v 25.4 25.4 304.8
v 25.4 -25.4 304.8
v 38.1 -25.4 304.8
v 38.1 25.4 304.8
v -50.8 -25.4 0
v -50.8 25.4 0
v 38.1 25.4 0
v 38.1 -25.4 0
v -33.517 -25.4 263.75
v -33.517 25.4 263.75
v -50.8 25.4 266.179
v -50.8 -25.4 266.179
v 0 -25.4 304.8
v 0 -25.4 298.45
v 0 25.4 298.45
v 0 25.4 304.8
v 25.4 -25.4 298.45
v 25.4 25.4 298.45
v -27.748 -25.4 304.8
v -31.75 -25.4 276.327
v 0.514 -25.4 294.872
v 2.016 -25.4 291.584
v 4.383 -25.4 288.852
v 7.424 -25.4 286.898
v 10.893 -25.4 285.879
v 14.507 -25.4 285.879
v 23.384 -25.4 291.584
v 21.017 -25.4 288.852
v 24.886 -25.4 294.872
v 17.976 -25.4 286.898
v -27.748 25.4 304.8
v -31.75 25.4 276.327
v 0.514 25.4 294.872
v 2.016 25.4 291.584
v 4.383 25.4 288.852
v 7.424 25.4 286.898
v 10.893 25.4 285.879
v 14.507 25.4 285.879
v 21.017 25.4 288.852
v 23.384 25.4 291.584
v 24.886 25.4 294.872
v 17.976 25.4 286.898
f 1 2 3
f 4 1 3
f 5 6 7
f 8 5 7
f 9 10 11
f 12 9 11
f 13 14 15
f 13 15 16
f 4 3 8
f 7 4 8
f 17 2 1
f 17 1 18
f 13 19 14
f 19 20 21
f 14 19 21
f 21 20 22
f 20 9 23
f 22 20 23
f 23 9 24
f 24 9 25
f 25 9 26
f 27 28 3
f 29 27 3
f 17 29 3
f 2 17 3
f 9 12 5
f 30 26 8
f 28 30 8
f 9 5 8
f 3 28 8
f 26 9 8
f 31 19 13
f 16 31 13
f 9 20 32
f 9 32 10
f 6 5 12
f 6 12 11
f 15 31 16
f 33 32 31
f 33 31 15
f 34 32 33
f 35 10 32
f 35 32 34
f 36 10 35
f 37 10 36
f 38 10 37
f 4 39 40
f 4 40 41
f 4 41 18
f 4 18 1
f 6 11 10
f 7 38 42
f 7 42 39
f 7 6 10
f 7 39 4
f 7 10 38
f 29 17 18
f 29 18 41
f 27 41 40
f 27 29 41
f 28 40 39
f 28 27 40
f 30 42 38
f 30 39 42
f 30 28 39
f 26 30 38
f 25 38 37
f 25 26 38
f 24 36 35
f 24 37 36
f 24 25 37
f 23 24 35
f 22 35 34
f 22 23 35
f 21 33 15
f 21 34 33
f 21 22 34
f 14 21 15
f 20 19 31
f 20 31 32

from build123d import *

# Parameters (mm, degrees)
SKETCH1_W               = 101.6
SKETCH1_H               = 50.8
BOSS_EXTRUDE1_DEPTH     = 304.8
CUT_EXTRUDE1_DEPTH      = 314.152231351
CUT_EXTRUDE1_DEPTH_BACK = 314.152231351
CUT_EXTRUDE2_DEPTH      = 314.152231351
CUT_EXTRUDE2_DEPTH_BACK = 314.152231351
SKETCH3_W               = 12.7
SKETCH3_H               = 304.8


with BuildPart() as part:
    # Sketch1 → Boss-Extrude1 (new body)
    with BuildSketch(Plane.XY):
        Rectangle(SKETCH1_W, SKETCH1_H)
    extrude(amount=BOSS_EXTRUDE1_DEPTH)

    # Sketch2 → Cut-Extrude1 (cut, two sides: drawn at the far end of the back side and taken through both)
    with BuildSketch(Plane(origin=(0, 25.4, 0), x_dir=(1, 0, 0), z_dir=(0, 1, 0)).offset(-CUT_EXTRUDE1_DEPTH_BACK)):
        with BuildLine():
            ThreePointArc((25.4, -298.45), (12.7, -285.75), (0, -298.45))
            ThreePointArc((0, -298.45), (0.432742006, -301.737001873), (1.701477372, -304.8))
            Line((1.701477372, -304.8), (23.698522628, -304.8))
            ThreePointArc((23.698522628, -304.8), (24.967257994, -301.737001873), (25.4, -298.45))
        make_face()
        with BuildLine():
            Line((23.698522628, -304.8), (1.701477372, -304.8))
            ThreePointArc((1.701477372, -304.8), (12.7, -311.15), (23.698522628, -304.8))
        make_face()
        with BuildLine():
            Line((25.4, -304.8), (25.4, -298.45))
            ThreePointArc((25.4, -298.45), (24.967257994, -301.737001873), (23.698522628, -304.8))
            Line((23.698522628, -304.8), (25.4, -304.8))
        make_face()
        with BuildLine():
            Line((0, -298.45), (0, -304.8))
            Line((0, -304.8), (1.701477372, -304.8))
            ThreePointArc((1.701477372, -304.8), (0.432742006, -301.737001873), (0, -298.45))
        make_face()
        Polygon((-31.75, -276.3266), (-50.8, -279.003902901), (-50.8, -304.8), (-27.748324597, -304.8), align=None)
        Polygon((-50.8, -266.17909273), (-50.8, -279.003902901), (-31.75, -276.3266), (-33.517498382, -263.750195527), align=None)
    extrude(amount=CUT_EXTRUDE1_DEPTH + CUT_EXTRUDE1_DEPTH_BACK, mode=Mode.SUBTRACT)

    # Sketch3 → Cut-Extrude2 (cut, two sides: drawn at the far end of the back side and taken through both)
    with BuildSketch(Plane(origin=(0, 25.4, 0), x_dir=(1, 0, 0), z_dir=(0, 1, 0)).offset(-CUT_EXTRUDE2_DEPTH_BACK)):
        with Locations((44.45, -152.4)):
            Rectangle(SKETCH3_W, SKETCH3_H)
    extrude(amount=CUT_EXTRUDE2_DEPTH + CUT_EXTRUDE2_DEPTH_BACK, mode=Mode.SUBTRACT)


solid = part.part
